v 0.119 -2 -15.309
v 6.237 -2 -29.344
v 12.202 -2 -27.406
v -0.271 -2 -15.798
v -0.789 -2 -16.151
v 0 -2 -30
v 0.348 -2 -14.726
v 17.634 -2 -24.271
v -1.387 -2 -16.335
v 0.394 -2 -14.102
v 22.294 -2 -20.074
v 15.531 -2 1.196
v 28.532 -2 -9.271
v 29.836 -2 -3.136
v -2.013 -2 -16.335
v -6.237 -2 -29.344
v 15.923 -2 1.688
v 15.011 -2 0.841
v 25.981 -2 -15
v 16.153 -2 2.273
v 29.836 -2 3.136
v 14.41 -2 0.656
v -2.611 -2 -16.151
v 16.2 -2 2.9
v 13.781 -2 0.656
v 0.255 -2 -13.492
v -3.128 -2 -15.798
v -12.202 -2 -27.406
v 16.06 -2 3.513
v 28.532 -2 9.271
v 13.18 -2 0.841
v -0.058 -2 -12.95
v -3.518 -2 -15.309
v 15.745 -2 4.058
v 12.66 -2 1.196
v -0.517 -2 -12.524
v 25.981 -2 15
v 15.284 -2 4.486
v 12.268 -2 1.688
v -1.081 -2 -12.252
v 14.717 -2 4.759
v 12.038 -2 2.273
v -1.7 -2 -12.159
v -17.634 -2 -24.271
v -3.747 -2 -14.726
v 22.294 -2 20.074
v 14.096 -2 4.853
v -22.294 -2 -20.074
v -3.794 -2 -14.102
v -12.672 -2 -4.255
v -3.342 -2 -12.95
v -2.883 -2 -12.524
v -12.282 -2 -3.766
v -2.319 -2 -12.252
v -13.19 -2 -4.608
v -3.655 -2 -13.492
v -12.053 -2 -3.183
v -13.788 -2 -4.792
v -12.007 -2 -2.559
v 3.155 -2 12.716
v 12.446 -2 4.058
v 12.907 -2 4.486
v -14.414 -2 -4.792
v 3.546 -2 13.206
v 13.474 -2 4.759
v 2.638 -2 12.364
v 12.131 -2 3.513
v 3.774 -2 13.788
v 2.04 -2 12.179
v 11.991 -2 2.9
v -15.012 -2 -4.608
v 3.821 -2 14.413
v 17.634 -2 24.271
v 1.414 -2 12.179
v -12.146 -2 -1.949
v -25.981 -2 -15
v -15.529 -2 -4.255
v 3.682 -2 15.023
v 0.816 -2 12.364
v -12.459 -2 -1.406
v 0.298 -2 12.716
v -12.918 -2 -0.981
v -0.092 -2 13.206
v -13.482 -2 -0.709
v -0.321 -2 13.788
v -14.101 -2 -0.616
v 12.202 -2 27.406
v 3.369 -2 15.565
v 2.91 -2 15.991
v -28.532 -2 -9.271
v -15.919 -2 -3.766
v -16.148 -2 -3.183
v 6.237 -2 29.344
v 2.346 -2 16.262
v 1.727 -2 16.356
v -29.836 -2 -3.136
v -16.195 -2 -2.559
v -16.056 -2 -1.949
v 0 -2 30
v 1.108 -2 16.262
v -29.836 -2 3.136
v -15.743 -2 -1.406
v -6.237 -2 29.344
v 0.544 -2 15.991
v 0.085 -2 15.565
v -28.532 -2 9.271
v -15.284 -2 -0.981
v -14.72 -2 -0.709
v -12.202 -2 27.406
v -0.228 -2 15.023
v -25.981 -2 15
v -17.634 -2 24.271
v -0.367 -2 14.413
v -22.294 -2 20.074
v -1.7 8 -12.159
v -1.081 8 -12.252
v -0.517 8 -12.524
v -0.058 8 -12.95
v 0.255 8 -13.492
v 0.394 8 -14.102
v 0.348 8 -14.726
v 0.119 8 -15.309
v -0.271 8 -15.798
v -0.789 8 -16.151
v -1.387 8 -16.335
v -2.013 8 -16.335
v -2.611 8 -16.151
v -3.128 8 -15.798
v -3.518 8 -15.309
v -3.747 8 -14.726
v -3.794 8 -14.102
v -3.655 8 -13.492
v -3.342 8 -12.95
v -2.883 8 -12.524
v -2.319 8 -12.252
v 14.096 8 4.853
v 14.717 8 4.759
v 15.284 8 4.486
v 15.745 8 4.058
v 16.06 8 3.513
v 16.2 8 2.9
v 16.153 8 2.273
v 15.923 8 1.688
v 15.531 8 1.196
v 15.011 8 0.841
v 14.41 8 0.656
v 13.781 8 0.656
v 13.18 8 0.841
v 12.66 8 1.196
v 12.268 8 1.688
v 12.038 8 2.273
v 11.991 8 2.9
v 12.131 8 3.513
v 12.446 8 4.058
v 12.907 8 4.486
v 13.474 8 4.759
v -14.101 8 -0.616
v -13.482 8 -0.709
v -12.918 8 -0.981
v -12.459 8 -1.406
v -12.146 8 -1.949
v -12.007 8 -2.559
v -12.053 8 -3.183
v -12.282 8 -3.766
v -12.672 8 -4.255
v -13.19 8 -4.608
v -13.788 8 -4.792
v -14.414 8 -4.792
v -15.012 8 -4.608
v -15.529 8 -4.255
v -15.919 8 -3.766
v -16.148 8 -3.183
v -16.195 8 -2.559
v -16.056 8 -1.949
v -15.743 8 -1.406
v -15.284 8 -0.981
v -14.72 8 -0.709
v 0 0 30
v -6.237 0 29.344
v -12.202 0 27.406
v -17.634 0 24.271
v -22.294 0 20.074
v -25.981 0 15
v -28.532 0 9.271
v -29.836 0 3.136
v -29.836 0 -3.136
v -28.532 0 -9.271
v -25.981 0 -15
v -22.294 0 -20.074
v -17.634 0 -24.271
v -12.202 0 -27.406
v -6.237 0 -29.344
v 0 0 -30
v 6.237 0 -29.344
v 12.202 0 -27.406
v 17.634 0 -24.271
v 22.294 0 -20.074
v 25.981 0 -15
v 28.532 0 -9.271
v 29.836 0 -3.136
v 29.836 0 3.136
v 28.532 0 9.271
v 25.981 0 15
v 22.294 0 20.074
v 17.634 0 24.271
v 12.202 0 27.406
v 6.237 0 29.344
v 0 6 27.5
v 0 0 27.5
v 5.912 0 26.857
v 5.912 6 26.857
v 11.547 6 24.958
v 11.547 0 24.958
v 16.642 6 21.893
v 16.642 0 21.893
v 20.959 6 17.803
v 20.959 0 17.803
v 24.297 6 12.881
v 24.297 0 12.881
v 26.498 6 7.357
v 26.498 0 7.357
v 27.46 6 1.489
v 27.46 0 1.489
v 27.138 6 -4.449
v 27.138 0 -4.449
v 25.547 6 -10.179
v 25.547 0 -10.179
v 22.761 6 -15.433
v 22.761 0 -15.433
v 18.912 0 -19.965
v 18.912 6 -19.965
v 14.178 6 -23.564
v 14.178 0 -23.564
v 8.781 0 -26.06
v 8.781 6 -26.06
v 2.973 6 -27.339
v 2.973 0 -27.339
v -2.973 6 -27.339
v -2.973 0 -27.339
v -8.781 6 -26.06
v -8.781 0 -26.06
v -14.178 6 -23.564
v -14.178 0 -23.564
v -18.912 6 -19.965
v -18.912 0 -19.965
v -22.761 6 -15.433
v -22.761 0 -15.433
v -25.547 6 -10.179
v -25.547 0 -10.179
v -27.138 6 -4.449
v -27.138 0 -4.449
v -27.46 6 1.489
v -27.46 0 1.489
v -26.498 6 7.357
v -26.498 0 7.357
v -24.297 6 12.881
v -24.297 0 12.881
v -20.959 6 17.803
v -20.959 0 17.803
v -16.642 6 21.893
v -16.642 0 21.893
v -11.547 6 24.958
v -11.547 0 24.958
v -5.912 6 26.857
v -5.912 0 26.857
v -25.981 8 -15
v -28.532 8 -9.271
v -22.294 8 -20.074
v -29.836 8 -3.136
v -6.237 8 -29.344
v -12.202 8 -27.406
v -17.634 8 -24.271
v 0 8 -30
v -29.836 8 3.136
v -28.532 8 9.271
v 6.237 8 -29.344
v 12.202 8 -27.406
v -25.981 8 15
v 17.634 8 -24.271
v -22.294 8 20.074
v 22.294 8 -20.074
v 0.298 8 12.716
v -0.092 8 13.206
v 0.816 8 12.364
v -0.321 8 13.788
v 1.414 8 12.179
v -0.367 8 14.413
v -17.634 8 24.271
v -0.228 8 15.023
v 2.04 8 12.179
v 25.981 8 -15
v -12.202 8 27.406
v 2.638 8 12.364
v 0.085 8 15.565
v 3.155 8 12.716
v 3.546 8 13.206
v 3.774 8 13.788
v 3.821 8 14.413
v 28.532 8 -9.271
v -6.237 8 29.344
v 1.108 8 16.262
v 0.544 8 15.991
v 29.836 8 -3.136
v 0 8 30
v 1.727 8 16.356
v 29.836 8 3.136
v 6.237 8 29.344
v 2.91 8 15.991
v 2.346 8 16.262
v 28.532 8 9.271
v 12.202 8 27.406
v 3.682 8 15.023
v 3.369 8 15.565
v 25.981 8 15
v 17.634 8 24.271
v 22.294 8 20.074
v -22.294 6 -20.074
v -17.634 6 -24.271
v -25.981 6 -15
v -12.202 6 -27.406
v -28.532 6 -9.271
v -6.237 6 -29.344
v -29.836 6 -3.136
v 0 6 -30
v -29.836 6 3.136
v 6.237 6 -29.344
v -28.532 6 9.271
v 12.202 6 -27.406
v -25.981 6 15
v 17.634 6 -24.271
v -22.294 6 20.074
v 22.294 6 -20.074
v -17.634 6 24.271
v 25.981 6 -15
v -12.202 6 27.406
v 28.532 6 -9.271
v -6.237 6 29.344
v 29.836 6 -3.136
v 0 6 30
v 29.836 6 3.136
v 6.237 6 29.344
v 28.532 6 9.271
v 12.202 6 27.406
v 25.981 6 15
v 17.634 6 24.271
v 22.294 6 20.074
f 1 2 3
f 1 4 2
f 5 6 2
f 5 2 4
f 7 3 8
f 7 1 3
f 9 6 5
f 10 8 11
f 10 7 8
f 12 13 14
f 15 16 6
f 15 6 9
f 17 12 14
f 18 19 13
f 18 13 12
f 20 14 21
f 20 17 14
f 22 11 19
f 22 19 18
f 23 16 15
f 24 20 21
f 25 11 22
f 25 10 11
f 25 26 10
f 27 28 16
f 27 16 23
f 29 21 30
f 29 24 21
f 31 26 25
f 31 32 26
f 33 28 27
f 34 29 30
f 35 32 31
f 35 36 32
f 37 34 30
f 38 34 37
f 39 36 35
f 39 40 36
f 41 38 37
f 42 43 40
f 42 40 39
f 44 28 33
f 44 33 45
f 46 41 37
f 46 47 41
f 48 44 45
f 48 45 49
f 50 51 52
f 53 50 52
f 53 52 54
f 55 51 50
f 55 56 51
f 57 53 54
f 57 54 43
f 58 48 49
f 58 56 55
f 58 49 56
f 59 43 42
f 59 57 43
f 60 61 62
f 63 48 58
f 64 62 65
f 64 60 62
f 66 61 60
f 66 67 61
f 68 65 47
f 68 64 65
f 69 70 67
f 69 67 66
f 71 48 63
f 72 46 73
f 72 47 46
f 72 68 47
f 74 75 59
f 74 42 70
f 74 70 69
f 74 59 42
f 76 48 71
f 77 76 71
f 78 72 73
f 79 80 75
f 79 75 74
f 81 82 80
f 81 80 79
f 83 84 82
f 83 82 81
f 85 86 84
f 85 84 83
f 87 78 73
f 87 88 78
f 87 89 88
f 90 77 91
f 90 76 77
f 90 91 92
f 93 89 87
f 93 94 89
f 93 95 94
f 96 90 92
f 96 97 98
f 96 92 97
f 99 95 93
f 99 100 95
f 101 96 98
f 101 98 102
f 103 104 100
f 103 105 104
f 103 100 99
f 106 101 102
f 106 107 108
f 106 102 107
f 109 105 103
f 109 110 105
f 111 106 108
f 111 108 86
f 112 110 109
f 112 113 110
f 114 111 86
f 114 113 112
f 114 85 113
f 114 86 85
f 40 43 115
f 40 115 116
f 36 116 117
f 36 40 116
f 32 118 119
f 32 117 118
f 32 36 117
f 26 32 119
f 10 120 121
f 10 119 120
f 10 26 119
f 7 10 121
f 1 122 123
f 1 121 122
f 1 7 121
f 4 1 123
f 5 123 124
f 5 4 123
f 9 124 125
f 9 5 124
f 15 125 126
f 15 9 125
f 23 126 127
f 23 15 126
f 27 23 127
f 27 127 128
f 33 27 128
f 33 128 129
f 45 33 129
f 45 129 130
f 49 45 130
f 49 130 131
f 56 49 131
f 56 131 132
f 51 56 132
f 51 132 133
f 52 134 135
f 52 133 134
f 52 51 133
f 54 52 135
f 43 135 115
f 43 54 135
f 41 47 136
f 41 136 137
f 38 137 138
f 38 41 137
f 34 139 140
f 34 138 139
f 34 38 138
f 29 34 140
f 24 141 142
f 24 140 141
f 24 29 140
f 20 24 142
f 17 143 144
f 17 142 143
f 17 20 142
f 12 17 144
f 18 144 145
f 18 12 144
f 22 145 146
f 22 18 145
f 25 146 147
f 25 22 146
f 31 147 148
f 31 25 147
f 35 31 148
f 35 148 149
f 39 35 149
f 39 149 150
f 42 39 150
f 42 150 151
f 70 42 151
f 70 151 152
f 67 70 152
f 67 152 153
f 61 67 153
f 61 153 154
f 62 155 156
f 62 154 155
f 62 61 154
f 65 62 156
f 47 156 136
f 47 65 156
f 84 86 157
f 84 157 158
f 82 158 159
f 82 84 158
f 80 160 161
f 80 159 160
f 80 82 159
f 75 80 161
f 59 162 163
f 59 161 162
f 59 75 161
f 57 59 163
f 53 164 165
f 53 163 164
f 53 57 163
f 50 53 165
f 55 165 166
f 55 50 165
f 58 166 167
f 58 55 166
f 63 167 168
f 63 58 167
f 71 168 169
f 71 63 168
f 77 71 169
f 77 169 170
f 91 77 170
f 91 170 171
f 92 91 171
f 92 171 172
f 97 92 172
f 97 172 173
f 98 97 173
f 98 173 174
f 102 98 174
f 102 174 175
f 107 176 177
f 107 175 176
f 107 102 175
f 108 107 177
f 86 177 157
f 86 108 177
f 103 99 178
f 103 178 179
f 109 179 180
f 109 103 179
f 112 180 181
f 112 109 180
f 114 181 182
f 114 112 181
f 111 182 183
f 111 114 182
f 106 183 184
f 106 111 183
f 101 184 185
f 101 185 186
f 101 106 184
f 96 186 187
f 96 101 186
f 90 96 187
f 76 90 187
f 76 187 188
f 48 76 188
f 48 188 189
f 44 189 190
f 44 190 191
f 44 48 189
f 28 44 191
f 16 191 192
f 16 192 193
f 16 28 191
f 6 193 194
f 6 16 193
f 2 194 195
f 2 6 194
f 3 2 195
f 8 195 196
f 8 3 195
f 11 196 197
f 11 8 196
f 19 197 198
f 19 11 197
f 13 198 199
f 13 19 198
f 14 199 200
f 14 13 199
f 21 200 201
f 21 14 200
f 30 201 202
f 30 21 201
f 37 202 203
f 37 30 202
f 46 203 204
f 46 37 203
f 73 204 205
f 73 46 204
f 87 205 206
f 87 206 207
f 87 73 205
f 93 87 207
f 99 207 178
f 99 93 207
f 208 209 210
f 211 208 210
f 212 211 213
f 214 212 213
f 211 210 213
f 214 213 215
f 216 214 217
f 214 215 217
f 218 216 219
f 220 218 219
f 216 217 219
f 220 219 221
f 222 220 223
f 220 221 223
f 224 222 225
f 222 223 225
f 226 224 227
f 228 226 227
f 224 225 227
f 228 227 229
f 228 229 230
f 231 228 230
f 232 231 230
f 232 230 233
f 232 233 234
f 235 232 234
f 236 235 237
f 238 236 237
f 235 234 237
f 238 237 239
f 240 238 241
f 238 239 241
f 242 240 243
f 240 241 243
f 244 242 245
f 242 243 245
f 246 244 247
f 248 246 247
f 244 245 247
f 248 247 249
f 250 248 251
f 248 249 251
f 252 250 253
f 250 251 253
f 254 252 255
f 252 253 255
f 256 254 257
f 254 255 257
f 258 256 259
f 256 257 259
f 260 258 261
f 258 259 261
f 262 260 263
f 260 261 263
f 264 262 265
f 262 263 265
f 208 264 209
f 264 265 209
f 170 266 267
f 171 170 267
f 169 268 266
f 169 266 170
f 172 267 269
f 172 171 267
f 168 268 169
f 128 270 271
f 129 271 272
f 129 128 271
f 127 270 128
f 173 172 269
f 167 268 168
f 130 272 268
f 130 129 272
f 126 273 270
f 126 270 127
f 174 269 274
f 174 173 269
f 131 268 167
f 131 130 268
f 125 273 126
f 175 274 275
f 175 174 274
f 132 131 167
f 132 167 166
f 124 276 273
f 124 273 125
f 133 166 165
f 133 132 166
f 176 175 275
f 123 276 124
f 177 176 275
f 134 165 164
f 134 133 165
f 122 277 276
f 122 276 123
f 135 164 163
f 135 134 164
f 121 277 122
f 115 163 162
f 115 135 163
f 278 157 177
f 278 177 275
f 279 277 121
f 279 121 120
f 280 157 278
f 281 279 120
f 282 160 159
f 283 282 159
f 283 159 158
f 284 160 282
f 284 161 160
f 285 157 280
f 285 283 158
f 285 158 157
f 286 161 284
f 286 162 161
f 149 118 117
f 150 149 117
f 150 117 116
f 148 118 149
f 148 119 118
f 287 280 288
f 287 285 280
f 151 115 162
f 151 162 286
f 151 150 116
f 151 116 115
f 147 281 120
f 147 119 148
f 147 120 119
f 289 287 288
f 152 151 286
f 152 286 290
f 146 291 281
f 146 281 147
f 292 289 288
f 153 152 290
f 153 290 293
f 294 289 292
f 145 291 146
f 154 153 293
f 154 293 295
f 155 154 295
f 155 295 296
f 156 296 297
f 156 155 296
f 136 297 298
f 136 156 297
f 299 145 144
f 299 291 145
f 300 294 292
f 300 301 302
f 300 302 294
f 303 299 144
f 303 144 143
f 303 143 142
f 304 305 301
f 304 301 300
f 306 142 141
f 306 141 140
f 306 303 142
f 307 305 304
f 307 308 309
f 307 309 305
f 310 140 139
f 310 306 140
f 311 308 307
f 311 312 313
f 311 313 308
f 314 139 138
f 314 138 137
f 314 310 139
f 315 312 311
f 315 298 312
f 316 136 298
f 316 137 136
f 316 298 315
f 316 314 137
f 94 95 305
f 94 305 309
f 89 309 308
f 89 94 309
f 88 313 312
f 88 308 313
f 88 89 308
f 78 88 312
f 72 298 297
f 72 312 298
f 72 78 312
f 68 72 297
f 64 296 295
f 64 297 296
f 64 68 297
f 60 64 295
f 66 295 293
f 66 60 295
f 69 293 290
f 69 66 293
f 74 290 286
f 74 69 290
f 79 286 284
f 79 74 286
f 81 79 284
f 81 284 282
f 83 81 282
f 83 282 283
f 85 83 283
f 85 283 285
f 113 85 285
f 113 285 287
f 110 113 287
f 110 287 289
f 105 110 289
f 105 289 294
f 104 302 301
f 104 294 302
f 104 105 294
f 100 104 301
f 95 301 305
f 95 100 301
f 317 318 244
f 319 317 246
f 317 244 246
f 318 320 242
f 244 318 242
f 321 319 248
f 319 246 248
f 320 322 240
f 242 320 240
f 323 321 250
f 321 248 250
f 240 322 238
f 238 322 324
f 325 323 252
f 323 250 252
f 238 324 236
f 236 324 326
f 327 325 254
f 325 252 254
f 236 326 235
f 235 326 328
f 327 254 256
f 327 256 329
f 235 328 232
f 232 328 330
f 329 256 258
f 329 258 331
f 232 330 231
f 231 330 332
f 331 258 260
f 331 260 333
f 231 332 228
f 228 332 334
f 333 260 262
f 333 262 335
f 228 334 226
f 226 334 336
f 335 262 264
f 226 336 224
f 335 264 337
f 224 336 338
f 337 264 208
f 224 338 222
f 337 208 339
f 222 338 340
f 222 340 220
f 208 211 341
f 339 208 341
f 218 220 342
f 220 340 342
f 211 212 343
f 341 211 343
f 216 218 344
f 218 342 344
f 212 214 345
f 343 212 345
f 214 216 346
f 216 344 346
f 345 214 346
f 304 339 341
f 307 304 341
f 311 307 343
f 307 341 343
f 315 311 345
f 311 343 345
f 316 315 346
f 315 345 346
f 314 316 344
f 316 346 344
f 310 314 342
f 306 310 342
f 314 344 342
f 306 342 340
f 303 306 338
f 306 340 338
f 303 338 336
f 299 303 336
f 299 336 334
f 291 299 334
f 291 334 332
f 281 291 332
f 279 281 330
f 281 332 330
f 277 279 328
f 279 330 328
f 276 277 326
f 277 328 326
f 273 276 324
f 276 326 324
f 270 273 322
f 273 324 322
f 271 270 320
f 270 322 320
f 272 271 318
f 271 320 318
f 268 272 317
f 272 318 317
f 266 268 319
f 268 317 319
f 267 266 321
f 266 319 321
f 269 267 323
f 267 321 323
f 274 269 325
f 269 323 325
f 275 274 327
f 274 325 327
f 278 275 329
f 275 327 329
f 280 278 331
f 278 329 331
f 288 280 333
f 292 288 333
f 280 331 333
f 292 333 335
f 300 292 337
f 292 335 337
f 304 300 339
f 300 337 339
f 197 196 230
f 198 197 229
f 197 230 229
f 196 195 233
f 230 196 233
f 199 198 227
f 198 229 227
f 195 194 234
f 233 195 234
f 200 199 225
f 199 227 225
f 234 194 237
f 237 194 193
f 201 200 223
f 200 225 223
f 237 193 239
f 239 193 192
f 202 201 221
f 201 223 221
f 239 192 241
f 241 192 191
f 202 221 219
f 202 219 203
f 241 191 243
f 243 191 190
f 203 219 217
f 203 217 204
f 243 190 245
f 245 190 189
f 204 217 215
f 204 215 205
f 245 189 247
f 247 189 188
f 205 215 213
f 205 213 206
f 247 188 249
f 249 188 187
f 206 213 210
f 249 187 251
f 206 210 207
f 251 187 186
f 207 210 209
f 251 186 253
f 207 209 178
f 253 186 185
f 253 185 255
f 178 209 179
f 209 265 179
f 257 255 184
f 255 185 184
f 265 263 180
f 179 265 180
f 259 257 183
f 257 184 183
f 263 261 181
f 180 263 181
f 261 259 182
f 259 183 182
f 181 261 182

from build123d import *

# Parameters (mm, degrees)
SKETCH_1_R               = 27.5
EXTRUDE_5_DEPTH          = 6
SKETCH_8_R               = 30
EXTRUDE_6_DEPTH          = 2
EXTRUDE_START            = 2
SKETCH_9_R               = 30
EXTRUDE_7_DEPTH          = 2
CUT_EXTRUDE_1_DEPTH      = 44.588989435
CUT_EXTRUDE_1_DEPTH_BACK = 44.588989435
SKETCH_12_R              = 2.11
SKETCH_12_R_2            = 2.1


with BuildPart() as part:
    # Эскиз1 → Бобышка-Вытянуть5 (new body)
    with BuildSketch(Plane(origin=(0, 0, 0), x_dir=(1, 0, 0), z_dir=(0, 1, 0))):
        with Locations(Location((0, 0, 0), (0, 0, 270))):
            Circle(SKETCH_1_R)
    extrude(amount=EXTRUDE_5_DEPTH)

    # Эскиз8 → Бобышка-Вытянуть6 (add)
    with BuildSketch(Plane(origin=(0, 6, 0), x_dir=(1, 0, 0), z_dir=(0, 1, 0))):
        with Locations(Location((0, 0, 0), (0, 0, 270))):
            Circle(SKETCH_8_R)
    extrude(amount=EXTRUDE_6_DEPTH)

    # Эскиз9 → Бобышка-Вытянуть7 (add)
    with BuildSketch(Plane.XZ.offset(EXTRUDE_START)):
        with Locations(Location((0, 0, 0), (0, 0, 90))):
            Circle(SKETCH_9_R)
    extrude(amount=-EXTRUDE_7_DEPTH)

    # Эскиз12 → Вырез-Вытянуть1 (cut, two sides: drawn at the far end of the back side and taken through both)
    with BuildSketch(Plane(origin=(0, 8, 0), x_dir=(1, 0, 0), z_dir=(0, 1, 0)).offset(-CUT_EXTRUDE_1_DEPTH_BACK)):
        with Locations(Location((14.095522252, -2.742507282, 0), (0, 0, 270))):
            Circle(SKETCH_12_R)
        with Locations(Location((1.726848044, -14.255633609, 0), (0, 0, 270))):
            Circle(SKETCH_12_R_2)
        with Locations(Location((-14.100702431, 2.71574754, 0), (0, 0, 270))):
            Circle(SKETCH_12_R_2)
        with Locations(Location((-1.699786223, 14.25888567, 0), (0, 0, 270))):
            Circle(SKETCH_12_R_2)
    extrude(amount=CUT_EXTRUDE_1_DEPTH + CUT_EXTRUDE_1_DEPTH_BACK, mode=Mode.SUBTRACT)


solid = part.part
